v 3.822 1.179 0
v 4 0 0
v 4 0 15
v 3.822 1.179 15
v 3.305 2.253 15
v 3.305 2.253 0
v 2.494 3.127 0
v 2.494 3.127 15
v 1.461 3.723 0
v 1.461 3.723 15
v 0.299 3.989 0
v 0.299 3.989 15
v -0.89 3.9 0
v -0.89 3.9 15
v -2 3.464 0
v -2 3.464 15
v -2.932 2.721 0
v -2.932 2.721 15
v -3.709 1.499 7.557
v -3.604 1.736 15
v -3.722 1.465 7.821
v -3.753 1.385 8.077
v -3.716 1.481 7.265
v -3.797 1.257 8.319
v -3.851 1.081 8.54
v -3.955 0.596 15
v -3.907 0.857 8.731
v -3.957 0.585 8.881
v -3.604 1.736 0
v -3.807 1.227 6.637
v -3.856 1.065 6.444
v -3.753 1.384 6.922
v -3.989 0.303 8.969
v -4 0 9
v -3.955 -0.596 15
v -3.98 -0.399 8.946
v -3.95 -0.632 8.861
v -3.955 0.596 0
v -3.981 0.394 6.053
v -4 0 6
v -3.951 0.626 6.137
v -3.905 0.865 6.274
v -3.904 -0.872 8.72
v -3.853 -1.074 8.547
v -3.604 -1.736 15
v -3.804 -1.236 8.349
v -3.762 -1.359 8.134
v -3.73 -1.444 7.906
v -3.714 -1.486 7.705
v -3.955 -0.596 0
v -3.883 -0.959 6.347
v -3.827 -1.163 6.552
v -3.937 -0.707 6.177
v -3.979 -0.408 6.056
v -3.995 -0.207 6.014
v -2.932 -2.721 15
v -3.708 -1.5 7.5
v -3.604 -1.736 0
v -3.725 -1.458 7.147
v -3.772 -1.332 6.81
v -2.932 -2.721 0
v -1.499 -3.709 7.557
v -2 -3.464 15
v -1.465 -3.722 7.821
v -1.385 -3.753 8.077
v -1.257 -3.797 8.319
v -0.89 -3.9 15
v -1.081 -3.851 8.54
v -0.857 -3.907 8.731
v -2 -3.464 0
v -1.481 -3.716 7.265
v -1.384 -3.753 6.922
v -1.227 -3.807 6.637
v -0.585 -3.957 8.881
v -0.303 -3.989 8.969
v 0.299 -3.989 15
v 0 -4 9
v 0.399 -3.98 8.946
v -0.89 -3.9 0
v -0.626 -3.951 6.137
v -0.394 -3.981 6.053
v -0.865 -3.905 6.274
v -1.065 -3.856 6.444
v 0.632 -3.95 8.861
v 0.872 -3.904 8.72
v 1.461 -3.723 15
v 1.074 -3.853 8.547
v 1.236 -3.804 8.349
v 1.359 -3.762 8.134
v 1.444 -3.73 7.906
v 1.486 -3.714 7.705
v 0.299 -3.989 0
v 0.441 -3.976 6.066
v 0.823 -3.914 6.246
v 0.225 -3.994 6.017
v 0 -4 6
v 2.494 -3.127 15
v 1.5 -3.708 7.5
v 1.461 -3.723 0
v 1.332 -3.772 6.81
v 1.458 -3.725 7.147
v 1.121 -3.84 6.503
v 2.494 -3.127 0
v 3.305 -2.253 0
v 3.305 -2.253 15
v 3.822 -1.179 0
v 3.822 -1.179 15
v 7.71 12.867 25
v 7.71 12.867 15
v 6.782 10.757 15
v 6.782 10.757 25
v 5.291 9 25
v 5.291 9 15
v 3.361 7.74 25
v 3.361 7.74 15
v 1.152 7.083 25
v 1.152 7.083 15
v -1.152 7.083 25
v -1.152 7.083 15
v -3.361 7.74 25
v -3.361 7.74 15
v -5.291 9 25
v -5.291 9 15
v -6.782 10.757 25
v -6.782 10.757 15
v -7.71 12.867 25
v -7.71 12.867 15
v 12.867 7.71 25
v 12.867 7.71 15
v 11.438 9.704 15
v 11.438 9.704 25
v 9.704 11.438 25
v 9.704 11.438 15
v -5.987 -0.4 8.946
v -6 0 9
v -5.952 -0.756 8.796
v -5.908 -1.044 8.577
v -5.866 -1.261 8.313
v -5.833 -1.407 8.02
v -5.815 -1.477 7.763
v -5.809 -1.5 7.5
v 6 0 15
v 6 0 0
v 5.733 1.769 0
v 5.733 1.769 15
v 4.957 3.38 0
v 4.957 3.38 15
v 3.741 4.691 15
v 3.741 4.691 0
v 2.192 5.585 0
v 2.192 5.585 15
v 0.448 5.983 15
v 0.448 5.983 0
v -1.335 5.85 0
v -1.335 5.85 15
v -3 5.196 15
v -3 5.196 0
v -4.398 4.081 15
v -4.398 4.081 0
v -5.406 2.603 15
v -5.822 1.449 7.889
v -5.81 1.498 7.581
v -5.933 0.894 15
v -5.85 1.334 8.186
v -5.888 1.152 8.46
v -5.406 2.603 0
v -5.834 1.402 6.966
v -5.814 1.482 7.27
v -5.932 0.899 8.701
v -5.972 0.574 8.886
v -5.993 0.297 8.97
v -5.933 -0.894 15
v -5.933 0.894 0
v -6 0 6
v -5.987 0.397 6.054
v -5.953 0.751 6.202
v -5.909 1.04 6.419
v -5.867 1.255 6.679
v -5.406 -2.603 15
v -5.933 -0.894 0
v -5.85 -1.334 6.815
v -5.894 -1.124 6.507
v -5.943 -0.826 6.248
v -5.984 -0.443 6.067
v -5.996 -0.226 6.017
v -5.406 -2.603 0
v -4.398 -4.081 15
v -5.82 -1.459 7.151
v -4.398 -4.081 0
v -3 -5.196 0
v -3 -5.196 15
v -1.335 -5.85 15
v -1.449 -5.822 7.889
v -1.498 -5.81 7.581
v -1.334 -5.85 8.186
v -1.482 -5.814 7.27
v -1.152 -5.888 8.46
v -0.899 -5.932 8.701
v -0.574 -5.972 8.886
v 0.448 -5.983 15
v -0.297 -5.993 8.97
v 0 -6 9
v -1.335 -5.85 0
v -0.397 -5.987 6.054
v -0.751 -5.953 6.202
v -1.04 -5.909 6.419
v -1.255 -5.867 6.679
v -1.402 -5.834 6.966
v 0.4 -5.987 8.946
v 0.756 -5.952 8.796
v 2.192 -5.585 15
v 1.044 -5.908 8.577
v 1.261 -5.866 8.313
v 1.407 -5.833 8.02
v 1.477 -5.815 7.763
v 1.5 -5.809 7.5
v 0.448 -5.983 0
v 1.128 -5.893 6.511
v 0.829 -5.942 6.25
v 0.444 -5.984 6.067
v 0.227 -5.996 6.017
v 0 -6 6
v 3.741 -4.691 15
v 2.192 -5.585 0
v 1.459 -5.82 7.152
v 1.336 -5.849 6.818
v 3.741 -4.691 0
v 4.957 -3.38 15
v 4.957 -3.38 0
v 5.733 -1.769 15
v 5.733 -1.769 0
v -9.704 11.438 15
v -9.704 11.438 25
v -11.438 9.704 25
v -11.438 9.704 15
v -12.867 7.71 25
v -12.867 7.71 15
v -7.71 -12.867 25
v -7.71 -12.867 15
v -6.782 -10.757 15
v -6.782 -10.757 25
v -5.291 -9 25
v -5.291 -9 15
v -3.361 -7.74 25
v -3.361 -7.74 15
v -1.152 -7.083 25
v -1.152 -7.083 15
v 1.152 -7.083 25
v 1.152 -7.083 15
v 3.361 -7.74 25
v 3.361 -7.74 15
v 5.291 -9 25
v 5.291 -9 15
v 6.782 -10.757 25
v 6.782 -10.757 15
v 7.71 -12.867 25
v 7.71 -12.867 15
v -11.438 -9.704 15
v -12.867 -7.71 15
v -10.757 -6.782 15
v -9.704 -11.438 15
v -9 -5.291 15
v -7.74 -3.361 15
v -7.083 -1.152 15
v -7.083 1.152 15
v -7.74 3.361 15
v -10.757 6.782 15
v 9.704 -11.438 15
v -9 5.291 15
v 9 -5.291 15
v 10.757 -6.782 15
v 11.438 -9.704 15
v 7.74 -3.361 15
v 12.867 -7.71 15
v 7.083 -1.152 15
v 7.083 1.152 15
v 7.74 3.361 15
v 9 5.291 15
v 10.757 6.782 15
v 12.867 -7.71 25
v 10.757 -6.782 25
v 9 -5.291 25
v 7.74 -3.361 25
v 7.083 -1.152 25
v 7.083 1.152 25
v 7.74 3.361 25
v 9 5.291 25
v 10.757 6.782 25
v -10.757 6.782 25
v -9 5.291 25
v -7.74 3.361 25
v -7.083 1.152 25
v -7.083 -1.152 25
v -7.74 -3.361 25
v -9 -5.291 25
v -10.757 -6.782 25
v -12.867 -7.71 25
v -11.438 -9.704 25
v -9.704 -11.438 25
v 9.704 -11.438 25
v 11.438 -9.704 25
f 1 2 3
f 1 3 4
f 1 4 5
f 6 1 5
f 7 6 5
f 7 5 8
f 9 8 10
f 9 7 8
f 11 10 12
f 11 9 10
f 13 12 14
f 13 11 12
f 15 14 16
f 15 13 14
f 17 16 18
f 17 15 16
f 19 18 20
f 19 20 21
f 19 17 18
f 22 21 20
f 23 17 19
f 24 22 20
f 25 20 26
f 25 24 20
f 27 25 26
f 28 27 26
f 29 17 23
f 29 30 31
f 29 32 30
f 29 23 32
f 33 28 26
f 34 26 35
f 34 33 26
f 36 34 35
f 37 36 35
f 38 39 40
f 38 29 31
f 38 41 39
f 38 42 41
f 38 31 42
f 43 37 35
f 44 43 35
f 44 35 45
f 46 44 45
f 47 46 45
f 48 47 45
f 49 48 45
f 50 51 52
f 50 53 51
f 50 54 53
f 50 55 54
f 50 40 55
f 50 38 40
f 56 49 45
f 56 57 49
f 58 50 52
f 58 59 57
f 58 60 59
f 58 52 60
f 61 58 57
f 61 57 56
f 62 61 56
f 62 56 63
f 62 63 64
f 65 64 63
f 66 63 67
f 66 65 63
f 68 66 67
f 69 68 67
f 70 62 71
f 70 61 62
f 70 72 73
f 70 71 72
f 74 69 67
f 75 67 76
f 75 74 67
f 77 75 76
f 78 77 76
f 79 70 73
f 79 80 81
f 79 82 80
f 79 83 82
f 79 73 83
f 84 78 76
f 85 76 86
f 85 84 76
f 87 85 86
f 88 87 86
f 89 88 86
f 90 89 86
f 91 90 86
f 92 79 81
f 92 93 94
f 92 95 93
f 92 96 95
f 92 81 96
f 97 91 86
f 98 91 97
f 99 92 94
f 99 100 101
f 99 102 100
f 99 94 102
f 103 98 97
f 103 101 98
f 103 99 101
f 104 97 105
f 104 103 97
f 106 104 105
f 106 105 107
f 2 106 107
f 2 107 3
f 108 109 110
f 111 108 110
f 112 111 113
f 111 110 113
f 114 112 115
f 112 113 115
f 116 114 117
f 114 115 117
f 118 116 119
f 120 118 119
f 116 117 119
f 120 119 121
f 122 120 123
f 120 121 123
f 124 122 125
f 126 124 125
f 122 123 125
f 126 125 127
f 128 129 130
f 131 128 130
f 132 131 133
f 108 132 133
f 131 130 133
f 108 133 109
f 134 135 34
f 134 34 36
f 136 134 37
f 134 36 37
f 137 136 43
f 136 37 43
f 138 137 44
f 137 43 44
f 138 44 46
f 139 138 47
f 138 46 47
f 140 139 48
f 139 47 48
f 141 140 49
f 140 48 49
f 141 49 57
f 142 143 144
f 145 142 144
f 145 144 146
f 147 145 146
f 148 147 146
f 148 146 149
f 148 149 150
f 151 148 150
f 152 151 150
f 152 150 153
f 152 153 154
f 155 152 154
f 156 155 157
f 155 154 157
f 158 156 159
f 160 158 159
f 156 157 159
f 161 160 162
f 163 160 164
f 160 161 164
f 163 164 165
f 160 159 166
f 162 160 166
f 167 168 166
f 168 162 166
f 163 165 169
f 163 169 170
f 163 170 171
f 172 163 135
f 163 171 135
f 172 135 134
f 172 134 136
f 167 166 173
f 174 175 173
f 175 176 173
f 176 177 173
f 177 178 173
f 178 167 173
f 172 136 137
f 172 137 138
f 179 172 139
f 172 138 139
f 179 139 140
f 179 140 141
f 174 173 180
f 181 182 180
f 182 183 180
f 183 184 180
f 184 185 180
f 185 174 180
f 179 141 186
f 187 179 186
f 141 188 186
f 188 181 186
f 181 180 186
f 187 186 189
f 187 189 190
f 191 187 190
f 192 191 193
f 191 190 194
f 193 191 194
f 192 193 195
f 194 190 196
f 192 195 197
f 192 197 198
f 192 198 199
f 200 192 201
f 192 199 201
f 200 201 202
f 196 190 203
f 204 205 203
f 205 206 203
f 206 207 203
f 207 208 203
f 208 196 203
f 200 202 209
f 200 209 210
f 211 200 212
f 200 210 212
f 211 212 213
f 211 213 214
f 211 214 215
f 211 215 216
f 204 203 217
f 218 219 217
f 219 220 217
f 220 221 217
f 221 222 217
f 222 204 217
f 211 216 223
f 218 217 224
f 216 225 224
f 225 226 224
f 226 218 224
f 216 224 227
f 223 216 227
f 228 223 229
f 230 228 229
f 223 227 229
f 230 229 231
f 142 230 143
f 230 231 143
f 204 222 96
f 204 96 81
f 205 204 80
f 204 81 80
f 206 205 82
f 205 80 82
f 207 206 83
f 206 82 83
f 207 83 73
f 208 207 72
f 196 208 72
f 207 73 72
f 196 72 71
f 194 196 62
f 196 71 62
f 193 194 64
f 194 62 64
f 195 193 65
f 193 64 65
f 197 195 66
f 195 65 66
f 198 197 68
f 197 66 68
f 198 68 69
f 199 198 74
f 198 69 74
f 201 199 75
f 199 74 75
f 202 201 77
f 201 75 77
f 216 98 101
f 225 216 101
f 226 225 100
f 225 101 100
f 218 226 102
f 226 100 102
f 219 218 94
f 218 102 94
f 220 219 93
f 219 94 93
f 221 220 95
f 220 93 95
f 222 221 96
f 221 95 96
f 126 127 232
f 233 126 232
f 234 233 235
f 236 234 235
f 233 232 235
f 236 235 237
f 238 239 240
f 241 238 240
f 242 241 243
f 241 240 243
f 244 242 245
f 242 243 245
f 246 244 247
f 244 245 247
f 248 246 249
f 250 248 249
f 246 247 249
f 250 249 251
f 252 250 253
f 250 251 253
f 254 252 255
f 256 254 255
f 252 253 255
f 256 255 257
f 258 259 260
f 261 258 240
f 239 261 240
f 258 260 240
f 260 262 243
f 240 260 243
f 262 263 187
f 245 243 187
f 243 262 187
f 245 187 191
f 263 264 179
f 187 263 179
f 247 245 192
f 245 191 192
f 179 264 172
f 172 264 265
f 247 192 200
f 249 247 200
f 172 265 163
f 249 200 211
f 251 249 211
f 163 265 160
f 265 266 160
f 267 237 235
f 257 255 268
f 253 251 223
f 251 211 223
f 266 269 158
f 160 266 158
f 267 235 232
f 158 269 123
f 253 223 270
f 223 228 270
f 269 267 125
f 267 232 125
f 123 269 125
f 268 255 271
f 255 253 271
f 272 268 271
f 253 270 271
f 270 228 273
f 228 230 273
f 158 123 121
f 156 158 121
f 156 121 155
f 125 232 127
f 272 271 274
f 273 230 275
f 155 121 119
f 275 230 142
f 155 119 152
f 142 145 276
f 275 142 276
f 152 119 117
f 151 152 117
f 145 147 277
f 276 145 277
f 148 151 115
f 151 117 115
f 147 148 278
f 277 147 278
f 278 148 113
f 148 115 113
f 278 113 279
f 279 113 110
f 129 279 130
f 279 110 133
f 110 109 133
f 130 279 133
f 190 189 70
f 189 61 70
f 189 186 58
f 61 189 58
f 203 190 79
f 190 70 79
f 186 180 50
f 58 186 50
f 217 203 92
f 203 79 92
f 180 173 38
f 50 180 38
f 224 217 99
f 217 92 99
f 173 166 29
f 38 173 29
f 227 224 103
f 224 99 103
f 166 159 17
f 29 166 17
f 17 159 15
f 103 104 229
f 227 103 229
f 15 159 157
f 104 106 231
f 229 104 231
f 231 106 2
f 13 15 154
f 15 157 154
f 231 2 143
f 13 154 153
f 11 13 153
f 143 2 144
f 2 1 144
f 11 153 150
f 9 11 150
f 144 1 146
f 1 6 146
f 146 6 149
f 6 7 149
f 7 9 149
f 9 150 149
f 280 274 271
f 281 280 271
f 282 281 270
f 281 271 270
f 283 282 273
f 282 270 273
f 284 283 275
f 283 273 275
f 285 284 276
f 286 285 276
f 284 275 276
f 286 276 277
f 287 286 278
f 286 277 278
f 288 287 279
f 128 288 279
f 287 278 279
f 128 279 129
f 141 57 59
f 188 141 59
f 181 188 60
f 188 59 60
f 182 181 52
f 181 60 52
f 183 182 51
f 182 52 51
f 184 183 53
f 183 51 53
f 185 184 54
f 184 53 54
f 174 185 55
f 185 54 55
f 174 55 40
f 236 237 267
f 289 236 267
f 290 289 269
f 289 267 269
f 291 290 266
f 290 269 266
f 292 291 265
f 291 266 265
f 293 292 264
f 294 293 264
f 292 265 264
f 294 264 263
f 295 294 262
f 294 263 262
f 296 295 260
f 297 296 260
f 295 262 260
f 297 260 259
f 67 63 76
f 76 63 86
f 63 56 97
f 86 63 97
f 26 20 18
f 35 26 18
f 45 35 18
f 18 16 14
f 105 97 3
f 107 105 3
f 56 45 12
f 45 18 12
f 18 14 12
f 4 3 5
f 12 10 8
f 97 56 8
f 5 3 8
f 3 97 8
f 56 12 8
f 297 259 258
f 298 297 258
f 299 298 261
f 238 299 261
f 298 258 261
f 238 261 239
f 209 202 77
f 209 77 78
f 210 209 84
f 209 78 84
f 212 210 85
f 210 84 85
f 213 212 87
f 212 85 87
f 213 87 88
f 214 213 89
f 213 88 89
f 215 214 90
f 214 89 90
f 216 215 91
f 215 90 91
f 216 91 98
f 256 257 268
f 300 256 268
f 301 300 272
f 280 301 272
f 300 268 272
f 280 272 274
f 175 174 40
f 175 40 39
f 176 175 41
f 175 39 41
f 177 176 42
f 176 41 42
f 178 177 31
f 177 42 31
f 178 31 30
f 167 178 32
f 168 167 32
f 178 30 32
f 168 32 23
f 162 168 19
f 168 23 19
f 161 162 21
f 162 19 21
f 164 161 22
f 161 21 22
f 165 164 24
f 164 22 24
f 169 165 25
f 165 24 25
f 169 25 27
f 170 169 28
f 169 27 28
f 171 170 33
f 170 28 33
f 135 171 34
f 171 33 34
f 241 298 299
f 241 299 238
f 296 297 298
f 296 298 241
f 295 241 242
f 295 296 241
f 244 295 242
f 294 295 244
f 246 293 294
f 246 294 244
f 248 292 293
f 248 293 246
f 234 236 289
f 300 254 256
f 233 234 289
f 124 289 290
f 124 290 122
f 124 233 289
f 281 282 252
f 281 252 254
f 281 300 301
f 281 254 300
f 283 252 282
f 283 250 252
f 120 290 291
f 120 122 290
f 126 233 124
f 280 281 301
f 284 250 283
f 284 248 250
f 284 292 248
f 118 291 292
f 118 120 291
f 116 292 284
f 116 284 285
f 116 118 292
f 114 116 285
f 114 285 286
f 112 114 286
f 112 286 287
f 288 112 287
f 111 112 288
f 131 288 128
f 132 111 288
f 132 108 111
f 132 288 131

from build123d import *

# Parameters (mm, degrees)
IZIM1_R                     = 6
IZIM1_R_2                   = 4
Y_KSEKLIK_EKSTR_ZYON1_DEPTH = 15
Y_KSEKLIK_EKSTR_ZYON2_DEPTH = 10
KES_EKSTR_ZYON1_DEPTH       = 15
DAIRESEL_KAPLAMA1_COUNT     = 2
DAIRESEL_KAPLAMA1_ANGLE     = 90


with BuildPart() as part:
    # Çizim1 → Yükseklik-Ekstrüzyon1 (new body)
    with BuildSketch(Plane.XY):
        Circle(IZIM1_R)
        Circle(IZIM1_R_2, mode=Mode.SUBTRACT)
    extrude(amount=Y_KSEKLIK_EKSTR_ZYON1_DEPTH)

    # Çizim2 → Yükseklik-Ekstrüzyon2 (add)
    with BuildSketch(Plane.XY.offset(15)):
        with BuildLine():
            ThreePointArc((-7.710310557, 12.866666667), (-10.606601718, 10.606601718), (-12.866666667, 7.710310557))
            ThreePointArc((-12.866666667, 7.710310557), (-7, 0), (-12.866666667, -7.710310557))
            ThreePointArc((-12.866666667, -7.710310557), (-10.606601718, -10.606601718), (-7.710310557, -12.866666667))
            ThreePointArc((-7.710310557, -12.866666667), (0, -7), (7.710310557, -12.866666667))
            ThreePointArc((7.710310557, -12.866666667), (10.606601718, -10.606601718), (12.866666667, -7.710310557))
            ThreePointArc((12.866666667, -7.710310557), (7, 0), (12.866666667, 7.710310557))
            ThreePointArc((12.866666667, 7.710310557), (10.606601718, 10.606601718), (7.710310557, 12.866666667))
            ThreePointArc((7.710310557, 12.866666667), (0, 7), (-7.710310557, 12.866666667))
        make_face()
    extrude(amount=Y_KSEKLIK_EKSTR_ZYON2_DEPTH)

    # Çizim3 → Kes-Ekstrüzyon1 (cut)
    with BuildSketch(Plane(origin=(0, 0, 0), x_dir=(1, 0, 0), z_dir=(0, 1, 0))):
        with BuildLine():
            ThreePointArc((1.5, -7.5), (1.060660172, -6.439339828), (0, -6))
            Line((0, -6), (0, -9))
            ThreePointArc((0, -9), (1.060660172, -8.560660172), (1.5, -7.5))
        make_face()
        with BuildLine():
            Line((0, -9), (0, -6))
            ThreePointArc((0, -6), (-1.5, -7.5), (0, -9))
        make_face()
    kes_ekstr_zyon1 = extrude(amount=-KES_EKSTR_ZYON1_DEPTH, mode=Mode.SUBTRACT)

    # Dairesel Kaplama1: Kes-Ekstrüzyon1 ×2 about axis
    dairesel_kaplama1_axis = Axis((0, 0, 15), (0, 0, -1))
    for i in range(1, DAIRESEL_KAPLAMA1_COUNT):
        add(kes_ekstr_zyon1.rotate(dairesel_kaplama1_axis, i * DAIRESEL_KAPLAMA1_ANGLE / (DAIRESEL_KAPLAMA1_COUNT - 1)), mode=Mode.SUBTRACT)


solid = part.part
